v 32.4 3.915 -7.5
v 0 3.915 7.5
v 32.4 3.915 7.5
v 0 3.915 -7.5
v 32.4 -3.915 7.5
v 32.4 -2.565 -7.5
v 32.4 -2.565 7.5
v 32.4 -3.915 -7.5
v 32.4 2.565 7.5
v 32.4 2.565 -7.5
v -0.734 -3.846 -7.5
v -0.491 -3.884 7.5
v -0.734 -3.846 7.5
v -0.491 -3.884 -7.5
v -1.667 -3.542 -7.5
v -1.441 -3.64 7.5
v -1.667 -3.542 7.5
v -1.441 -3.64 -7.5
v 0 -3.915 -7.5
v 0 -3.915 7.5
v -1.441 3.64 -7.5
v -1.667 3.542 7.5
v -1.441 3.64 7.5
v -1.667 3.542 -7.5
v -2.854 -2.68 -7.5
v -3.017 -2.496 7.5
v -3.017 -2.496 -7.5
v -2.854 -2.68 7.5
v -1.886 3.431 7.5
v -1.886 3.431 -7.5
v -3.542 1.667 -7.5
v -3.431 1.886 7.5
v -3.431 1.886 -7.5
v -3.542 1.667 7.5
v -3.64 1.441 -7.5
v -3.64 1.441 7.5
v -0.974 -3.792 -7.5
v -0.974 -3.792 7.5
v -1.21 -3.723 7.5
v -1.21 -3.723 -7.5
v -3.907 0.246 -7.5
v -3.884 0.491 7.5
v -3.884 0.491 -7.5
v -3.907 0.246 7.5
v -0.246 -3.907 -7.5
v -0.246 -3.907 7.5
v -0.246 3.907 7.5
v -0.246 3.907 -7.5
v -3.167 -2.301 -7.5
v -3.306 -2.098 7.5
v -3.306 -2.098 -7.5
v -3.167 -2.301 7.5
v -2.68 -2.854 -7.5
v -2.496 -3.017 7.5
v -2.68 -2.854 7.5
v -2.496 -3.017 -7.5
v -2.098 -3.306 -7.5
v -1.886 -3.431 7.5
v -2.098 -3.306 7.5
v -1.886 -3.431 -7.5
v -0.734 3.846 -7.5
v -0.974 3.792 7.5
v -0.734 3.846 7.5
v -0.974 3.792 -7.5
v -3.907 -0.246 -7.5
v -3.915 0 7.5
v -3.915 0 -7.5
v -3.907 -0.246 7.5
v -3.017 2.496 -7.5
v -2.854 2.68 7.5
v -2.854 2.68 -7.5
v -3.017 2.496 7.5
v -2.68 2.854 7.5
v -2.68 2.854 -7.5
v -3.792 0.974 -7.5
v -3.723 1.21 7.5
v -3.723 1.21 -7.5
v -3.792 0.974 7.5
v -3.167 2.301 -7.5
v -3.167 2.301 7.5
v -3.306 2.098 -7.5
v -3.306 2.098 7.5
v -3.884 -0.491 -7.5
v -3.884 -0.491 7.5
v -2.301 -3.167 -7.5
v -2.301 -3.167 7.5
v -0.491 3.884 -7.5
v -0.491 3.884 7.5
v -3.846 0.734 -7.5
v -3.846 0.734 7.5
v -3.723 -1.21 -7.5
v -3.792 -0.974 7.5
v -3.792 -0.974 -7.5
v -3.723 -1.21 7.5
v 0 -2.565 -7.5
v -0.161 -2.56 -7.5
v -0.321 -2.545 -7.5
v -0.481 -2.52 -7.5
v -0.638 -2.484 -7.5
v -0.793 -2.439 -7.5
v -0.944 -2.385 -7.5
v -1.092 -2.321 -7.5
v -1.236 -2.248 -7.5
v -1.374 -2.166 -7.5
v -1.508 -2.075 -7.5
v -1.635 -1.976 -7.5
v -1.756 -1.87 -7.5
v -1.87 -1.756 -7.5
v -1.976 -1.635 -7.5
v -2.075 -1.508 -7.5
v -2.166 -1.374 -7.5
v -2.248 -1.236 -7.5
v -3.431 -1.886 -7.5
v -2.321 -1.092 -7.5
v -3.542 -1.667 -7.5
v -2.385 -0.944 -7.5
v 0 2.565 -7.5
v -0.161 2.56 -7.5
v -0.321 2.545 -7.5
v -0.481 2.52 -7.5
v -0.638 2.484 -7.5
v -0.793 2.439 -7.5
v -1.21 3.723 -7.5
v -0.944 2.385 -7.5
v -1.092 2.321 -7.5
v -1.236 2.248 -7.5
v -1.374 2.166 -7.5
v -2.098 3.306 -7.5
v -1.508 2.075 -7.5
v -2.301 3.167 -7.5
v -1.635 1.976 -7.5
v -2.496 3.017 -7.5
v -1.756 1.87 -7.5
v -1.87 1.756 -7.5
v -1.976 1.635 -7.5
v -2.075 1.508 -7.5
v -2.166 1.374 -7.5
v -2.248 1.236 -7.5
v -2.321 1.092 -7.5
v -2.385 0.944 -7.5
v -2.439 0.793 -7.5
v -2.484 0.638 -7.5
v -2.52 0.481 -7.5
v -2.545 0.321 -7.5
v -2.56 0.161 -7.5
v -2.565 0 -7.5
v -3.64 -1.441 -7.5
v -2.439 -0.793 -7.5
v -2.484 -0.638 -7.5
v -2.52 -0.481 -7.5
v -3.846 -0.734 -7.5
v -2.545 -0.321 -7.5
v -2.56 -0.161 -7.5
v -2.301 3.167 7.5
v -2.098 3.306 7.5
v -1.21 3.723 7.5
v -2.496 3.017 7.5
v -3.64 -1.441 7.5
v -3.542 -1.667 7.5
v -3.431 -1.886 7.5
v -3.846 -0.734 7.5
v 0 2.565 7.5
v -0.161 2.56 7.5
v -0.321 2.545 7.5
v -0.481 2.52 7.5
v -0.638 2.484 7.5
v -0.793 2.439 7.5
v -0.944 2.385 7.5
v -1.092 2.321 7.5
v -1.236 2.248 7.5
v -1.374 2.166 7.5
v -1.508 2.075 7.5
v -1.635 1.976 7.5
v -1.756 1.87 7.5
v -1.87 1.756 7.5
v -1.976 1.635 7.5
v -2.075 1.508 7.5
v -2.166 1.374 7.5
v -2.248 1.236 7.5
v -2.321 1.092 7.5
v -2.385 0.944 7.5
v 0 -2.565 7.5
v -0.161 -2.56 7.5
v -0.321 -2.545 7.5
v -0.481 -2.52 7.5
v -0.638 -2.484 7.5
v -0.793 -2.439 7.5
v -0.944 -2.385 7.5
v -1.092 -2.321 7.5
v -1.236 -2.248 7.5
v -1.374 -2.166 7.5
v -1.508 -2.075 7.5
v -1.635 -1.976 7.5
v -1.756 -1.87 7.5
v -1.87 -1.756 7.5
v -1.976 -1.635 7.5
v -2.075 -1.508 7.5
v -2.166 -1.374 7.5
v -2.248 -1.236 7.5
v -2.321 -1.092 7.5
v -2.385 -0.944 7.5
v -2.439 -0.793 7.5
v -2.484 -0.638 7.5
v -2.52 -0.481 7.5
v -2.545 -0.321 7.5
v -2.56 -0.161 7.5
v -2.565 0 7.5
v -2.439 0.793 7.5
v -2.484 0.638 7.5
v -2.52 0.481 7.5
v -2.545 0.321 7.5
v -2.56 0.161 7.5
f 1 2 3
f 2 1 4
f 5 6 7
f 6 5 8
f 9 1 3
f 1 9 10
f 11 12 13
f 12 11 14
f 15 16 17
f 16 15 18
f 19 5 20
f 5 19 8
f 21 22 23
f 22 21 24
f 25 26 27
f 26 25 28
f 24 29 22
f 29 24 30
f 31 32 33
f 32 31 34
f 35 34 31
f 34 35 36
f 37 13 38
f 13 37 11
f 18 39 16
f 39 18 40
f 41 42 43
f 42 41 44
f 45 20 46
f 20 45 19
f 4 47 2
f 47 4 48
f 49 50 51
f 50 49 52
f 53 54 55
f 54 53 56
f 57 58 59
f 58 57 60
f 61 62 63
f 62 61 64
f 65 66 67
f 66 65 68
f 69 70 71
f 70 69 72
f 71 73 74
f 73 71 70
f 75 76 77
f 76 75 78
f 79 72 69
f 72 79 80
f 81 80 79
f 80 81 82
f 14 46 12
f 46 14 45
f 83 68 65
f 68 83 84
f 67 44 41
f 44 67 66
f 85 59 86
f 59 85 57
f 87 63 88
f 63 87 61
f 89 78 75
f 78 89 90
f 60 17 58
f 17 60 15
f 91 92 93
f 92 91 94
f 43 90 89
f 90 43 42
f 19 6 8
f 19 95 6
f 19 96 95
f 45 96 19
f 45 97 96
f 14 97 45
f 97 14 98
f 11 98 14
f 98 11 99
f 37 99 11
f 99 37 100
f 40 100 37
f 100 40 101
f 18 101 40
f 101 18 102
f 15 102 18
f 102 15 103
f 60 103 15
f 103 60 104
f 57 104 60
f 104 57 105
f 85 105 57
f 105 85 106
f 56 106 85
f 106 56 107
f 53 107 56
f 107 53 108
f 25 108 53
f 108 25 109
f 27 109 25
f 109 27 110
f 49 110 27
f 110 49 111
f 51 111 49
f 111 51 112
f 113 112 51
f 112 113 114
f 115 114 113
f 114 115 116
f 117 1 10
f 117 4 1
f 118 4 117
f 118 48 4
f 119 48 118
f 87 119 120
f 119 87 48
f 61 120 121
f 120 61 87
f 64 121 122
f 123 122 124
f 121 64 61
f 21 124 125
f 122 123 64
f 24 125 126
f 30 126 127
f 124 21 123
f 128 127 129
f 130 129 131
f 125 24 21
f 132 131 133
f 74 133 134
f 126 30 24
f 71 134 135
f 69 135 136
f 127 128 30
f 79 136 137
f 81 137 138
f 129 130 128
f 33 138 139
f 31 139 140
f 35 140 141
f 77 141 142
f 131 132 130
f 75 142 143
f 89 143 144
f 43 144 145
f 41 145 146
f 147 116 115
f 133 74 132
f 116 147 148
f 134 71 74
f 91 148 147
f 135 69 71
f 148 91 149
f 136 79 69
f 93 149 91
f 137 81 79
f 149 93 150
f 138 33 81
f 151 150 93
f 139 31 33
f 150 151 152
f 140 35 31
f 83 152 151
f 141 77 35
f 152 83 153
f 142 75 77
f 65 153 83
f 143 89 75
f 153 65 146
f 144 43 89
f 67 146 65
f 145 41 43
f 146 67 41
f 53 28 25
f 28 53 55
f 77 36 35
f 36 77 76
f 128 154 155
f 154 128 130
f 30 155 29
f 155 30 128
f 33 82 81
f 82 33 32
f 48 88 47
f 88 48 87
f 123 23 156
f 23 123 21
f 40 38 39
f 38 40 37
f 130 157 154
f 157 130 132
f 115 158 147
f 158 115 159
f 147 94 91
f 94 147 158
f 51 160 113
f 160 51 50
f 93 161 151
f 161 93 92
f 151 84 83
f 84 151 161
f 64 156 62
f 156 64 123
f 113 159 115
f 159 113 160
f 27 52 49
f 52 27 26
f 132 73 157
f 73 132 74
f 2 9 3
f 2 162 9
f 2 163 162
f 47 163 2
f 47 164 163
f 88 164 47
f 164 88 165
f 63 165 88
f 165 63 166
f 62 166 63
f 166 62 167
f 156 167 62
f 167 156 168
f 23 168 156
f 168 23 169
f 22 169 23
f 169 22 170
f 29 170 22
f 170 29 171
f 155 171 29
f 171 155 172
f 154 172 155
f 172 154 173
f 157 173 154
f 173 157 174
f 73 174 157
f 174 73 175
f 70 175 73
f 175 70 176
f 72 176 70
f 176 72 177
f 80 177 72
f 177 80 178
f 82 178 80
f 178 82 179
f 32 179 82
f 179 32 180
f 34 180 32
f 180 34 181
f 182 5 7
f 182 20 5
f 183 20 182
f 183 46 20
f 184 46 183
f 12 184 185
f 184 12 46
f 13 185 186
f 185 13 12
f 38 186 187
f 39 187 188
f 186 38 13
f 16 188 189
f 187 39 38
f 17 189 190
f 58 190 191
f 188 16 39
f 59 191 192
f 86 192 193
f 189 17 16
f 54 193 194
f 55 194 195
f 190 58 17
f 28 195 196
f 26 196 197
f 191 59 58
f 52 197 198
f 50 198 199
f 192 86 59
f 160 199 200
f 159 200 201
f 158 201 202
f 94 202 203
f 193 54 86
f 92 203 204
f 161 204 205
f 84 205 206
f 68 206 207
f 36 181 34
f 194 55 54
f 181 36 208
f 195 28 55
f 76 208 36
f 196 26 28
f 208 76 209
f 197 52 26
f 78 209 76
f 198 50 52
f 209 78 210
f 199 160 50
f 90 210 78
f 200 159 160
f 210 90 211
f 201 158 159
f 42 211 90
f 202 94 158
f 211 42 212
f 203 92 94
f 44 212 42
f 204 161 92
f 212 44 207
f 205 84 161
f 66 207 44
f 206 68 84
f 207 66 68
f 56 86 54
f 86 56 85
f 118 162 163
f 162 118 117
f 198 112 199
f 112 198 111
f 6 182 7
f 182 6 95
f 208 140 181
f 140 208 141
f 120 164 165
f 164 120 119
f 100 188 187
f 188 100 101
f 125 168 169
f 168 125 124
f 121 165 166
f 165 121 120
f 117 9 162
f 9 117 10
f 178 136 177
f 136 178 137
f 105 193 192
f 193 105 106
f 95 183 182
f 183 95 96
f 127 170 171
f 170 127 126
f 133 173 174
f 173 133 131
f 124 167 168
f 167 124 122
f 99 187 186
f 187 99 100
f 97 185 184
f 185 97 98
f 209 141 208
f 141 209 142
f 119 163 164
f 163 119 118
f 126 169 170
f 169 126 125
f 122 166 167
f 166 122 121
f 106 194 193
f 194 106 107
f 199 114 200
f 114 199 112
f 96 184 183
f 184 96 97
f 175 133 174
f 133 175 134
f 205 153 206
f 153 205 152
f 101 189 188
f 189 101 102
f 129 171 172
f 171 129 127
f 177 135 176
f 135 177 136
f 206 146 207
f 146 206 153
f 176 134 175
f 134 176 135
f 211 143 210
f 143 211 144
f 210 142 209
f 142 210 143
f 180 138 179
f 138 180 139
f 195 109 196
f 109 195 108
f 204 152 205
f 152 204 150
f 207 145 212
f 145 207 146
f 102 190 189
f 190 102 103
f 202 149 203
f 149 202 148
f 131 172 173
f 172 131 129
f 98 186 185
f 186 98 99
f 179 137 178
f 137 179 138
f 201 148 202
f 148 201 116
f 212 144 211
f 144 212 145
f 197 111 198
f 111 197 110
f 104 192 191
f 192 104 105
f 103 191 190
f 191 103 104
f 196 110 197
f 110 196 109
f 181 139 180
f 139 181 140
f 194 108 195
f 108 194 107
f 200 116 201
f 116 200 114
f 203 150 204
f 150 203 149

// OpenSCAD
$fn=100;

thickness=2.7;
clip_length=thickness*12;
clip_width=15;
fiddle=1;

module clip_shape(height, width, length) {
    end_cube_thickness=3;
    hull() {
        translate([length-end_cube_thickness/2, 0, 0]) {
           cube([end_cube_thickness, width, height], center=true);
        }
        rotate([90, 0, 0]) cylinder(h=width, d=height, center=true);
    }
}


module hollowed_clip_shape() {
    difference() {
       clip_shape(2.9*thickness, clip_width, clip_length);
       clip_shape(1.9*thickness, clip_width+fiddle, clip_length+fiddle);
    }
}

rotate([90,0,0]) hollowed_clip_shape();
